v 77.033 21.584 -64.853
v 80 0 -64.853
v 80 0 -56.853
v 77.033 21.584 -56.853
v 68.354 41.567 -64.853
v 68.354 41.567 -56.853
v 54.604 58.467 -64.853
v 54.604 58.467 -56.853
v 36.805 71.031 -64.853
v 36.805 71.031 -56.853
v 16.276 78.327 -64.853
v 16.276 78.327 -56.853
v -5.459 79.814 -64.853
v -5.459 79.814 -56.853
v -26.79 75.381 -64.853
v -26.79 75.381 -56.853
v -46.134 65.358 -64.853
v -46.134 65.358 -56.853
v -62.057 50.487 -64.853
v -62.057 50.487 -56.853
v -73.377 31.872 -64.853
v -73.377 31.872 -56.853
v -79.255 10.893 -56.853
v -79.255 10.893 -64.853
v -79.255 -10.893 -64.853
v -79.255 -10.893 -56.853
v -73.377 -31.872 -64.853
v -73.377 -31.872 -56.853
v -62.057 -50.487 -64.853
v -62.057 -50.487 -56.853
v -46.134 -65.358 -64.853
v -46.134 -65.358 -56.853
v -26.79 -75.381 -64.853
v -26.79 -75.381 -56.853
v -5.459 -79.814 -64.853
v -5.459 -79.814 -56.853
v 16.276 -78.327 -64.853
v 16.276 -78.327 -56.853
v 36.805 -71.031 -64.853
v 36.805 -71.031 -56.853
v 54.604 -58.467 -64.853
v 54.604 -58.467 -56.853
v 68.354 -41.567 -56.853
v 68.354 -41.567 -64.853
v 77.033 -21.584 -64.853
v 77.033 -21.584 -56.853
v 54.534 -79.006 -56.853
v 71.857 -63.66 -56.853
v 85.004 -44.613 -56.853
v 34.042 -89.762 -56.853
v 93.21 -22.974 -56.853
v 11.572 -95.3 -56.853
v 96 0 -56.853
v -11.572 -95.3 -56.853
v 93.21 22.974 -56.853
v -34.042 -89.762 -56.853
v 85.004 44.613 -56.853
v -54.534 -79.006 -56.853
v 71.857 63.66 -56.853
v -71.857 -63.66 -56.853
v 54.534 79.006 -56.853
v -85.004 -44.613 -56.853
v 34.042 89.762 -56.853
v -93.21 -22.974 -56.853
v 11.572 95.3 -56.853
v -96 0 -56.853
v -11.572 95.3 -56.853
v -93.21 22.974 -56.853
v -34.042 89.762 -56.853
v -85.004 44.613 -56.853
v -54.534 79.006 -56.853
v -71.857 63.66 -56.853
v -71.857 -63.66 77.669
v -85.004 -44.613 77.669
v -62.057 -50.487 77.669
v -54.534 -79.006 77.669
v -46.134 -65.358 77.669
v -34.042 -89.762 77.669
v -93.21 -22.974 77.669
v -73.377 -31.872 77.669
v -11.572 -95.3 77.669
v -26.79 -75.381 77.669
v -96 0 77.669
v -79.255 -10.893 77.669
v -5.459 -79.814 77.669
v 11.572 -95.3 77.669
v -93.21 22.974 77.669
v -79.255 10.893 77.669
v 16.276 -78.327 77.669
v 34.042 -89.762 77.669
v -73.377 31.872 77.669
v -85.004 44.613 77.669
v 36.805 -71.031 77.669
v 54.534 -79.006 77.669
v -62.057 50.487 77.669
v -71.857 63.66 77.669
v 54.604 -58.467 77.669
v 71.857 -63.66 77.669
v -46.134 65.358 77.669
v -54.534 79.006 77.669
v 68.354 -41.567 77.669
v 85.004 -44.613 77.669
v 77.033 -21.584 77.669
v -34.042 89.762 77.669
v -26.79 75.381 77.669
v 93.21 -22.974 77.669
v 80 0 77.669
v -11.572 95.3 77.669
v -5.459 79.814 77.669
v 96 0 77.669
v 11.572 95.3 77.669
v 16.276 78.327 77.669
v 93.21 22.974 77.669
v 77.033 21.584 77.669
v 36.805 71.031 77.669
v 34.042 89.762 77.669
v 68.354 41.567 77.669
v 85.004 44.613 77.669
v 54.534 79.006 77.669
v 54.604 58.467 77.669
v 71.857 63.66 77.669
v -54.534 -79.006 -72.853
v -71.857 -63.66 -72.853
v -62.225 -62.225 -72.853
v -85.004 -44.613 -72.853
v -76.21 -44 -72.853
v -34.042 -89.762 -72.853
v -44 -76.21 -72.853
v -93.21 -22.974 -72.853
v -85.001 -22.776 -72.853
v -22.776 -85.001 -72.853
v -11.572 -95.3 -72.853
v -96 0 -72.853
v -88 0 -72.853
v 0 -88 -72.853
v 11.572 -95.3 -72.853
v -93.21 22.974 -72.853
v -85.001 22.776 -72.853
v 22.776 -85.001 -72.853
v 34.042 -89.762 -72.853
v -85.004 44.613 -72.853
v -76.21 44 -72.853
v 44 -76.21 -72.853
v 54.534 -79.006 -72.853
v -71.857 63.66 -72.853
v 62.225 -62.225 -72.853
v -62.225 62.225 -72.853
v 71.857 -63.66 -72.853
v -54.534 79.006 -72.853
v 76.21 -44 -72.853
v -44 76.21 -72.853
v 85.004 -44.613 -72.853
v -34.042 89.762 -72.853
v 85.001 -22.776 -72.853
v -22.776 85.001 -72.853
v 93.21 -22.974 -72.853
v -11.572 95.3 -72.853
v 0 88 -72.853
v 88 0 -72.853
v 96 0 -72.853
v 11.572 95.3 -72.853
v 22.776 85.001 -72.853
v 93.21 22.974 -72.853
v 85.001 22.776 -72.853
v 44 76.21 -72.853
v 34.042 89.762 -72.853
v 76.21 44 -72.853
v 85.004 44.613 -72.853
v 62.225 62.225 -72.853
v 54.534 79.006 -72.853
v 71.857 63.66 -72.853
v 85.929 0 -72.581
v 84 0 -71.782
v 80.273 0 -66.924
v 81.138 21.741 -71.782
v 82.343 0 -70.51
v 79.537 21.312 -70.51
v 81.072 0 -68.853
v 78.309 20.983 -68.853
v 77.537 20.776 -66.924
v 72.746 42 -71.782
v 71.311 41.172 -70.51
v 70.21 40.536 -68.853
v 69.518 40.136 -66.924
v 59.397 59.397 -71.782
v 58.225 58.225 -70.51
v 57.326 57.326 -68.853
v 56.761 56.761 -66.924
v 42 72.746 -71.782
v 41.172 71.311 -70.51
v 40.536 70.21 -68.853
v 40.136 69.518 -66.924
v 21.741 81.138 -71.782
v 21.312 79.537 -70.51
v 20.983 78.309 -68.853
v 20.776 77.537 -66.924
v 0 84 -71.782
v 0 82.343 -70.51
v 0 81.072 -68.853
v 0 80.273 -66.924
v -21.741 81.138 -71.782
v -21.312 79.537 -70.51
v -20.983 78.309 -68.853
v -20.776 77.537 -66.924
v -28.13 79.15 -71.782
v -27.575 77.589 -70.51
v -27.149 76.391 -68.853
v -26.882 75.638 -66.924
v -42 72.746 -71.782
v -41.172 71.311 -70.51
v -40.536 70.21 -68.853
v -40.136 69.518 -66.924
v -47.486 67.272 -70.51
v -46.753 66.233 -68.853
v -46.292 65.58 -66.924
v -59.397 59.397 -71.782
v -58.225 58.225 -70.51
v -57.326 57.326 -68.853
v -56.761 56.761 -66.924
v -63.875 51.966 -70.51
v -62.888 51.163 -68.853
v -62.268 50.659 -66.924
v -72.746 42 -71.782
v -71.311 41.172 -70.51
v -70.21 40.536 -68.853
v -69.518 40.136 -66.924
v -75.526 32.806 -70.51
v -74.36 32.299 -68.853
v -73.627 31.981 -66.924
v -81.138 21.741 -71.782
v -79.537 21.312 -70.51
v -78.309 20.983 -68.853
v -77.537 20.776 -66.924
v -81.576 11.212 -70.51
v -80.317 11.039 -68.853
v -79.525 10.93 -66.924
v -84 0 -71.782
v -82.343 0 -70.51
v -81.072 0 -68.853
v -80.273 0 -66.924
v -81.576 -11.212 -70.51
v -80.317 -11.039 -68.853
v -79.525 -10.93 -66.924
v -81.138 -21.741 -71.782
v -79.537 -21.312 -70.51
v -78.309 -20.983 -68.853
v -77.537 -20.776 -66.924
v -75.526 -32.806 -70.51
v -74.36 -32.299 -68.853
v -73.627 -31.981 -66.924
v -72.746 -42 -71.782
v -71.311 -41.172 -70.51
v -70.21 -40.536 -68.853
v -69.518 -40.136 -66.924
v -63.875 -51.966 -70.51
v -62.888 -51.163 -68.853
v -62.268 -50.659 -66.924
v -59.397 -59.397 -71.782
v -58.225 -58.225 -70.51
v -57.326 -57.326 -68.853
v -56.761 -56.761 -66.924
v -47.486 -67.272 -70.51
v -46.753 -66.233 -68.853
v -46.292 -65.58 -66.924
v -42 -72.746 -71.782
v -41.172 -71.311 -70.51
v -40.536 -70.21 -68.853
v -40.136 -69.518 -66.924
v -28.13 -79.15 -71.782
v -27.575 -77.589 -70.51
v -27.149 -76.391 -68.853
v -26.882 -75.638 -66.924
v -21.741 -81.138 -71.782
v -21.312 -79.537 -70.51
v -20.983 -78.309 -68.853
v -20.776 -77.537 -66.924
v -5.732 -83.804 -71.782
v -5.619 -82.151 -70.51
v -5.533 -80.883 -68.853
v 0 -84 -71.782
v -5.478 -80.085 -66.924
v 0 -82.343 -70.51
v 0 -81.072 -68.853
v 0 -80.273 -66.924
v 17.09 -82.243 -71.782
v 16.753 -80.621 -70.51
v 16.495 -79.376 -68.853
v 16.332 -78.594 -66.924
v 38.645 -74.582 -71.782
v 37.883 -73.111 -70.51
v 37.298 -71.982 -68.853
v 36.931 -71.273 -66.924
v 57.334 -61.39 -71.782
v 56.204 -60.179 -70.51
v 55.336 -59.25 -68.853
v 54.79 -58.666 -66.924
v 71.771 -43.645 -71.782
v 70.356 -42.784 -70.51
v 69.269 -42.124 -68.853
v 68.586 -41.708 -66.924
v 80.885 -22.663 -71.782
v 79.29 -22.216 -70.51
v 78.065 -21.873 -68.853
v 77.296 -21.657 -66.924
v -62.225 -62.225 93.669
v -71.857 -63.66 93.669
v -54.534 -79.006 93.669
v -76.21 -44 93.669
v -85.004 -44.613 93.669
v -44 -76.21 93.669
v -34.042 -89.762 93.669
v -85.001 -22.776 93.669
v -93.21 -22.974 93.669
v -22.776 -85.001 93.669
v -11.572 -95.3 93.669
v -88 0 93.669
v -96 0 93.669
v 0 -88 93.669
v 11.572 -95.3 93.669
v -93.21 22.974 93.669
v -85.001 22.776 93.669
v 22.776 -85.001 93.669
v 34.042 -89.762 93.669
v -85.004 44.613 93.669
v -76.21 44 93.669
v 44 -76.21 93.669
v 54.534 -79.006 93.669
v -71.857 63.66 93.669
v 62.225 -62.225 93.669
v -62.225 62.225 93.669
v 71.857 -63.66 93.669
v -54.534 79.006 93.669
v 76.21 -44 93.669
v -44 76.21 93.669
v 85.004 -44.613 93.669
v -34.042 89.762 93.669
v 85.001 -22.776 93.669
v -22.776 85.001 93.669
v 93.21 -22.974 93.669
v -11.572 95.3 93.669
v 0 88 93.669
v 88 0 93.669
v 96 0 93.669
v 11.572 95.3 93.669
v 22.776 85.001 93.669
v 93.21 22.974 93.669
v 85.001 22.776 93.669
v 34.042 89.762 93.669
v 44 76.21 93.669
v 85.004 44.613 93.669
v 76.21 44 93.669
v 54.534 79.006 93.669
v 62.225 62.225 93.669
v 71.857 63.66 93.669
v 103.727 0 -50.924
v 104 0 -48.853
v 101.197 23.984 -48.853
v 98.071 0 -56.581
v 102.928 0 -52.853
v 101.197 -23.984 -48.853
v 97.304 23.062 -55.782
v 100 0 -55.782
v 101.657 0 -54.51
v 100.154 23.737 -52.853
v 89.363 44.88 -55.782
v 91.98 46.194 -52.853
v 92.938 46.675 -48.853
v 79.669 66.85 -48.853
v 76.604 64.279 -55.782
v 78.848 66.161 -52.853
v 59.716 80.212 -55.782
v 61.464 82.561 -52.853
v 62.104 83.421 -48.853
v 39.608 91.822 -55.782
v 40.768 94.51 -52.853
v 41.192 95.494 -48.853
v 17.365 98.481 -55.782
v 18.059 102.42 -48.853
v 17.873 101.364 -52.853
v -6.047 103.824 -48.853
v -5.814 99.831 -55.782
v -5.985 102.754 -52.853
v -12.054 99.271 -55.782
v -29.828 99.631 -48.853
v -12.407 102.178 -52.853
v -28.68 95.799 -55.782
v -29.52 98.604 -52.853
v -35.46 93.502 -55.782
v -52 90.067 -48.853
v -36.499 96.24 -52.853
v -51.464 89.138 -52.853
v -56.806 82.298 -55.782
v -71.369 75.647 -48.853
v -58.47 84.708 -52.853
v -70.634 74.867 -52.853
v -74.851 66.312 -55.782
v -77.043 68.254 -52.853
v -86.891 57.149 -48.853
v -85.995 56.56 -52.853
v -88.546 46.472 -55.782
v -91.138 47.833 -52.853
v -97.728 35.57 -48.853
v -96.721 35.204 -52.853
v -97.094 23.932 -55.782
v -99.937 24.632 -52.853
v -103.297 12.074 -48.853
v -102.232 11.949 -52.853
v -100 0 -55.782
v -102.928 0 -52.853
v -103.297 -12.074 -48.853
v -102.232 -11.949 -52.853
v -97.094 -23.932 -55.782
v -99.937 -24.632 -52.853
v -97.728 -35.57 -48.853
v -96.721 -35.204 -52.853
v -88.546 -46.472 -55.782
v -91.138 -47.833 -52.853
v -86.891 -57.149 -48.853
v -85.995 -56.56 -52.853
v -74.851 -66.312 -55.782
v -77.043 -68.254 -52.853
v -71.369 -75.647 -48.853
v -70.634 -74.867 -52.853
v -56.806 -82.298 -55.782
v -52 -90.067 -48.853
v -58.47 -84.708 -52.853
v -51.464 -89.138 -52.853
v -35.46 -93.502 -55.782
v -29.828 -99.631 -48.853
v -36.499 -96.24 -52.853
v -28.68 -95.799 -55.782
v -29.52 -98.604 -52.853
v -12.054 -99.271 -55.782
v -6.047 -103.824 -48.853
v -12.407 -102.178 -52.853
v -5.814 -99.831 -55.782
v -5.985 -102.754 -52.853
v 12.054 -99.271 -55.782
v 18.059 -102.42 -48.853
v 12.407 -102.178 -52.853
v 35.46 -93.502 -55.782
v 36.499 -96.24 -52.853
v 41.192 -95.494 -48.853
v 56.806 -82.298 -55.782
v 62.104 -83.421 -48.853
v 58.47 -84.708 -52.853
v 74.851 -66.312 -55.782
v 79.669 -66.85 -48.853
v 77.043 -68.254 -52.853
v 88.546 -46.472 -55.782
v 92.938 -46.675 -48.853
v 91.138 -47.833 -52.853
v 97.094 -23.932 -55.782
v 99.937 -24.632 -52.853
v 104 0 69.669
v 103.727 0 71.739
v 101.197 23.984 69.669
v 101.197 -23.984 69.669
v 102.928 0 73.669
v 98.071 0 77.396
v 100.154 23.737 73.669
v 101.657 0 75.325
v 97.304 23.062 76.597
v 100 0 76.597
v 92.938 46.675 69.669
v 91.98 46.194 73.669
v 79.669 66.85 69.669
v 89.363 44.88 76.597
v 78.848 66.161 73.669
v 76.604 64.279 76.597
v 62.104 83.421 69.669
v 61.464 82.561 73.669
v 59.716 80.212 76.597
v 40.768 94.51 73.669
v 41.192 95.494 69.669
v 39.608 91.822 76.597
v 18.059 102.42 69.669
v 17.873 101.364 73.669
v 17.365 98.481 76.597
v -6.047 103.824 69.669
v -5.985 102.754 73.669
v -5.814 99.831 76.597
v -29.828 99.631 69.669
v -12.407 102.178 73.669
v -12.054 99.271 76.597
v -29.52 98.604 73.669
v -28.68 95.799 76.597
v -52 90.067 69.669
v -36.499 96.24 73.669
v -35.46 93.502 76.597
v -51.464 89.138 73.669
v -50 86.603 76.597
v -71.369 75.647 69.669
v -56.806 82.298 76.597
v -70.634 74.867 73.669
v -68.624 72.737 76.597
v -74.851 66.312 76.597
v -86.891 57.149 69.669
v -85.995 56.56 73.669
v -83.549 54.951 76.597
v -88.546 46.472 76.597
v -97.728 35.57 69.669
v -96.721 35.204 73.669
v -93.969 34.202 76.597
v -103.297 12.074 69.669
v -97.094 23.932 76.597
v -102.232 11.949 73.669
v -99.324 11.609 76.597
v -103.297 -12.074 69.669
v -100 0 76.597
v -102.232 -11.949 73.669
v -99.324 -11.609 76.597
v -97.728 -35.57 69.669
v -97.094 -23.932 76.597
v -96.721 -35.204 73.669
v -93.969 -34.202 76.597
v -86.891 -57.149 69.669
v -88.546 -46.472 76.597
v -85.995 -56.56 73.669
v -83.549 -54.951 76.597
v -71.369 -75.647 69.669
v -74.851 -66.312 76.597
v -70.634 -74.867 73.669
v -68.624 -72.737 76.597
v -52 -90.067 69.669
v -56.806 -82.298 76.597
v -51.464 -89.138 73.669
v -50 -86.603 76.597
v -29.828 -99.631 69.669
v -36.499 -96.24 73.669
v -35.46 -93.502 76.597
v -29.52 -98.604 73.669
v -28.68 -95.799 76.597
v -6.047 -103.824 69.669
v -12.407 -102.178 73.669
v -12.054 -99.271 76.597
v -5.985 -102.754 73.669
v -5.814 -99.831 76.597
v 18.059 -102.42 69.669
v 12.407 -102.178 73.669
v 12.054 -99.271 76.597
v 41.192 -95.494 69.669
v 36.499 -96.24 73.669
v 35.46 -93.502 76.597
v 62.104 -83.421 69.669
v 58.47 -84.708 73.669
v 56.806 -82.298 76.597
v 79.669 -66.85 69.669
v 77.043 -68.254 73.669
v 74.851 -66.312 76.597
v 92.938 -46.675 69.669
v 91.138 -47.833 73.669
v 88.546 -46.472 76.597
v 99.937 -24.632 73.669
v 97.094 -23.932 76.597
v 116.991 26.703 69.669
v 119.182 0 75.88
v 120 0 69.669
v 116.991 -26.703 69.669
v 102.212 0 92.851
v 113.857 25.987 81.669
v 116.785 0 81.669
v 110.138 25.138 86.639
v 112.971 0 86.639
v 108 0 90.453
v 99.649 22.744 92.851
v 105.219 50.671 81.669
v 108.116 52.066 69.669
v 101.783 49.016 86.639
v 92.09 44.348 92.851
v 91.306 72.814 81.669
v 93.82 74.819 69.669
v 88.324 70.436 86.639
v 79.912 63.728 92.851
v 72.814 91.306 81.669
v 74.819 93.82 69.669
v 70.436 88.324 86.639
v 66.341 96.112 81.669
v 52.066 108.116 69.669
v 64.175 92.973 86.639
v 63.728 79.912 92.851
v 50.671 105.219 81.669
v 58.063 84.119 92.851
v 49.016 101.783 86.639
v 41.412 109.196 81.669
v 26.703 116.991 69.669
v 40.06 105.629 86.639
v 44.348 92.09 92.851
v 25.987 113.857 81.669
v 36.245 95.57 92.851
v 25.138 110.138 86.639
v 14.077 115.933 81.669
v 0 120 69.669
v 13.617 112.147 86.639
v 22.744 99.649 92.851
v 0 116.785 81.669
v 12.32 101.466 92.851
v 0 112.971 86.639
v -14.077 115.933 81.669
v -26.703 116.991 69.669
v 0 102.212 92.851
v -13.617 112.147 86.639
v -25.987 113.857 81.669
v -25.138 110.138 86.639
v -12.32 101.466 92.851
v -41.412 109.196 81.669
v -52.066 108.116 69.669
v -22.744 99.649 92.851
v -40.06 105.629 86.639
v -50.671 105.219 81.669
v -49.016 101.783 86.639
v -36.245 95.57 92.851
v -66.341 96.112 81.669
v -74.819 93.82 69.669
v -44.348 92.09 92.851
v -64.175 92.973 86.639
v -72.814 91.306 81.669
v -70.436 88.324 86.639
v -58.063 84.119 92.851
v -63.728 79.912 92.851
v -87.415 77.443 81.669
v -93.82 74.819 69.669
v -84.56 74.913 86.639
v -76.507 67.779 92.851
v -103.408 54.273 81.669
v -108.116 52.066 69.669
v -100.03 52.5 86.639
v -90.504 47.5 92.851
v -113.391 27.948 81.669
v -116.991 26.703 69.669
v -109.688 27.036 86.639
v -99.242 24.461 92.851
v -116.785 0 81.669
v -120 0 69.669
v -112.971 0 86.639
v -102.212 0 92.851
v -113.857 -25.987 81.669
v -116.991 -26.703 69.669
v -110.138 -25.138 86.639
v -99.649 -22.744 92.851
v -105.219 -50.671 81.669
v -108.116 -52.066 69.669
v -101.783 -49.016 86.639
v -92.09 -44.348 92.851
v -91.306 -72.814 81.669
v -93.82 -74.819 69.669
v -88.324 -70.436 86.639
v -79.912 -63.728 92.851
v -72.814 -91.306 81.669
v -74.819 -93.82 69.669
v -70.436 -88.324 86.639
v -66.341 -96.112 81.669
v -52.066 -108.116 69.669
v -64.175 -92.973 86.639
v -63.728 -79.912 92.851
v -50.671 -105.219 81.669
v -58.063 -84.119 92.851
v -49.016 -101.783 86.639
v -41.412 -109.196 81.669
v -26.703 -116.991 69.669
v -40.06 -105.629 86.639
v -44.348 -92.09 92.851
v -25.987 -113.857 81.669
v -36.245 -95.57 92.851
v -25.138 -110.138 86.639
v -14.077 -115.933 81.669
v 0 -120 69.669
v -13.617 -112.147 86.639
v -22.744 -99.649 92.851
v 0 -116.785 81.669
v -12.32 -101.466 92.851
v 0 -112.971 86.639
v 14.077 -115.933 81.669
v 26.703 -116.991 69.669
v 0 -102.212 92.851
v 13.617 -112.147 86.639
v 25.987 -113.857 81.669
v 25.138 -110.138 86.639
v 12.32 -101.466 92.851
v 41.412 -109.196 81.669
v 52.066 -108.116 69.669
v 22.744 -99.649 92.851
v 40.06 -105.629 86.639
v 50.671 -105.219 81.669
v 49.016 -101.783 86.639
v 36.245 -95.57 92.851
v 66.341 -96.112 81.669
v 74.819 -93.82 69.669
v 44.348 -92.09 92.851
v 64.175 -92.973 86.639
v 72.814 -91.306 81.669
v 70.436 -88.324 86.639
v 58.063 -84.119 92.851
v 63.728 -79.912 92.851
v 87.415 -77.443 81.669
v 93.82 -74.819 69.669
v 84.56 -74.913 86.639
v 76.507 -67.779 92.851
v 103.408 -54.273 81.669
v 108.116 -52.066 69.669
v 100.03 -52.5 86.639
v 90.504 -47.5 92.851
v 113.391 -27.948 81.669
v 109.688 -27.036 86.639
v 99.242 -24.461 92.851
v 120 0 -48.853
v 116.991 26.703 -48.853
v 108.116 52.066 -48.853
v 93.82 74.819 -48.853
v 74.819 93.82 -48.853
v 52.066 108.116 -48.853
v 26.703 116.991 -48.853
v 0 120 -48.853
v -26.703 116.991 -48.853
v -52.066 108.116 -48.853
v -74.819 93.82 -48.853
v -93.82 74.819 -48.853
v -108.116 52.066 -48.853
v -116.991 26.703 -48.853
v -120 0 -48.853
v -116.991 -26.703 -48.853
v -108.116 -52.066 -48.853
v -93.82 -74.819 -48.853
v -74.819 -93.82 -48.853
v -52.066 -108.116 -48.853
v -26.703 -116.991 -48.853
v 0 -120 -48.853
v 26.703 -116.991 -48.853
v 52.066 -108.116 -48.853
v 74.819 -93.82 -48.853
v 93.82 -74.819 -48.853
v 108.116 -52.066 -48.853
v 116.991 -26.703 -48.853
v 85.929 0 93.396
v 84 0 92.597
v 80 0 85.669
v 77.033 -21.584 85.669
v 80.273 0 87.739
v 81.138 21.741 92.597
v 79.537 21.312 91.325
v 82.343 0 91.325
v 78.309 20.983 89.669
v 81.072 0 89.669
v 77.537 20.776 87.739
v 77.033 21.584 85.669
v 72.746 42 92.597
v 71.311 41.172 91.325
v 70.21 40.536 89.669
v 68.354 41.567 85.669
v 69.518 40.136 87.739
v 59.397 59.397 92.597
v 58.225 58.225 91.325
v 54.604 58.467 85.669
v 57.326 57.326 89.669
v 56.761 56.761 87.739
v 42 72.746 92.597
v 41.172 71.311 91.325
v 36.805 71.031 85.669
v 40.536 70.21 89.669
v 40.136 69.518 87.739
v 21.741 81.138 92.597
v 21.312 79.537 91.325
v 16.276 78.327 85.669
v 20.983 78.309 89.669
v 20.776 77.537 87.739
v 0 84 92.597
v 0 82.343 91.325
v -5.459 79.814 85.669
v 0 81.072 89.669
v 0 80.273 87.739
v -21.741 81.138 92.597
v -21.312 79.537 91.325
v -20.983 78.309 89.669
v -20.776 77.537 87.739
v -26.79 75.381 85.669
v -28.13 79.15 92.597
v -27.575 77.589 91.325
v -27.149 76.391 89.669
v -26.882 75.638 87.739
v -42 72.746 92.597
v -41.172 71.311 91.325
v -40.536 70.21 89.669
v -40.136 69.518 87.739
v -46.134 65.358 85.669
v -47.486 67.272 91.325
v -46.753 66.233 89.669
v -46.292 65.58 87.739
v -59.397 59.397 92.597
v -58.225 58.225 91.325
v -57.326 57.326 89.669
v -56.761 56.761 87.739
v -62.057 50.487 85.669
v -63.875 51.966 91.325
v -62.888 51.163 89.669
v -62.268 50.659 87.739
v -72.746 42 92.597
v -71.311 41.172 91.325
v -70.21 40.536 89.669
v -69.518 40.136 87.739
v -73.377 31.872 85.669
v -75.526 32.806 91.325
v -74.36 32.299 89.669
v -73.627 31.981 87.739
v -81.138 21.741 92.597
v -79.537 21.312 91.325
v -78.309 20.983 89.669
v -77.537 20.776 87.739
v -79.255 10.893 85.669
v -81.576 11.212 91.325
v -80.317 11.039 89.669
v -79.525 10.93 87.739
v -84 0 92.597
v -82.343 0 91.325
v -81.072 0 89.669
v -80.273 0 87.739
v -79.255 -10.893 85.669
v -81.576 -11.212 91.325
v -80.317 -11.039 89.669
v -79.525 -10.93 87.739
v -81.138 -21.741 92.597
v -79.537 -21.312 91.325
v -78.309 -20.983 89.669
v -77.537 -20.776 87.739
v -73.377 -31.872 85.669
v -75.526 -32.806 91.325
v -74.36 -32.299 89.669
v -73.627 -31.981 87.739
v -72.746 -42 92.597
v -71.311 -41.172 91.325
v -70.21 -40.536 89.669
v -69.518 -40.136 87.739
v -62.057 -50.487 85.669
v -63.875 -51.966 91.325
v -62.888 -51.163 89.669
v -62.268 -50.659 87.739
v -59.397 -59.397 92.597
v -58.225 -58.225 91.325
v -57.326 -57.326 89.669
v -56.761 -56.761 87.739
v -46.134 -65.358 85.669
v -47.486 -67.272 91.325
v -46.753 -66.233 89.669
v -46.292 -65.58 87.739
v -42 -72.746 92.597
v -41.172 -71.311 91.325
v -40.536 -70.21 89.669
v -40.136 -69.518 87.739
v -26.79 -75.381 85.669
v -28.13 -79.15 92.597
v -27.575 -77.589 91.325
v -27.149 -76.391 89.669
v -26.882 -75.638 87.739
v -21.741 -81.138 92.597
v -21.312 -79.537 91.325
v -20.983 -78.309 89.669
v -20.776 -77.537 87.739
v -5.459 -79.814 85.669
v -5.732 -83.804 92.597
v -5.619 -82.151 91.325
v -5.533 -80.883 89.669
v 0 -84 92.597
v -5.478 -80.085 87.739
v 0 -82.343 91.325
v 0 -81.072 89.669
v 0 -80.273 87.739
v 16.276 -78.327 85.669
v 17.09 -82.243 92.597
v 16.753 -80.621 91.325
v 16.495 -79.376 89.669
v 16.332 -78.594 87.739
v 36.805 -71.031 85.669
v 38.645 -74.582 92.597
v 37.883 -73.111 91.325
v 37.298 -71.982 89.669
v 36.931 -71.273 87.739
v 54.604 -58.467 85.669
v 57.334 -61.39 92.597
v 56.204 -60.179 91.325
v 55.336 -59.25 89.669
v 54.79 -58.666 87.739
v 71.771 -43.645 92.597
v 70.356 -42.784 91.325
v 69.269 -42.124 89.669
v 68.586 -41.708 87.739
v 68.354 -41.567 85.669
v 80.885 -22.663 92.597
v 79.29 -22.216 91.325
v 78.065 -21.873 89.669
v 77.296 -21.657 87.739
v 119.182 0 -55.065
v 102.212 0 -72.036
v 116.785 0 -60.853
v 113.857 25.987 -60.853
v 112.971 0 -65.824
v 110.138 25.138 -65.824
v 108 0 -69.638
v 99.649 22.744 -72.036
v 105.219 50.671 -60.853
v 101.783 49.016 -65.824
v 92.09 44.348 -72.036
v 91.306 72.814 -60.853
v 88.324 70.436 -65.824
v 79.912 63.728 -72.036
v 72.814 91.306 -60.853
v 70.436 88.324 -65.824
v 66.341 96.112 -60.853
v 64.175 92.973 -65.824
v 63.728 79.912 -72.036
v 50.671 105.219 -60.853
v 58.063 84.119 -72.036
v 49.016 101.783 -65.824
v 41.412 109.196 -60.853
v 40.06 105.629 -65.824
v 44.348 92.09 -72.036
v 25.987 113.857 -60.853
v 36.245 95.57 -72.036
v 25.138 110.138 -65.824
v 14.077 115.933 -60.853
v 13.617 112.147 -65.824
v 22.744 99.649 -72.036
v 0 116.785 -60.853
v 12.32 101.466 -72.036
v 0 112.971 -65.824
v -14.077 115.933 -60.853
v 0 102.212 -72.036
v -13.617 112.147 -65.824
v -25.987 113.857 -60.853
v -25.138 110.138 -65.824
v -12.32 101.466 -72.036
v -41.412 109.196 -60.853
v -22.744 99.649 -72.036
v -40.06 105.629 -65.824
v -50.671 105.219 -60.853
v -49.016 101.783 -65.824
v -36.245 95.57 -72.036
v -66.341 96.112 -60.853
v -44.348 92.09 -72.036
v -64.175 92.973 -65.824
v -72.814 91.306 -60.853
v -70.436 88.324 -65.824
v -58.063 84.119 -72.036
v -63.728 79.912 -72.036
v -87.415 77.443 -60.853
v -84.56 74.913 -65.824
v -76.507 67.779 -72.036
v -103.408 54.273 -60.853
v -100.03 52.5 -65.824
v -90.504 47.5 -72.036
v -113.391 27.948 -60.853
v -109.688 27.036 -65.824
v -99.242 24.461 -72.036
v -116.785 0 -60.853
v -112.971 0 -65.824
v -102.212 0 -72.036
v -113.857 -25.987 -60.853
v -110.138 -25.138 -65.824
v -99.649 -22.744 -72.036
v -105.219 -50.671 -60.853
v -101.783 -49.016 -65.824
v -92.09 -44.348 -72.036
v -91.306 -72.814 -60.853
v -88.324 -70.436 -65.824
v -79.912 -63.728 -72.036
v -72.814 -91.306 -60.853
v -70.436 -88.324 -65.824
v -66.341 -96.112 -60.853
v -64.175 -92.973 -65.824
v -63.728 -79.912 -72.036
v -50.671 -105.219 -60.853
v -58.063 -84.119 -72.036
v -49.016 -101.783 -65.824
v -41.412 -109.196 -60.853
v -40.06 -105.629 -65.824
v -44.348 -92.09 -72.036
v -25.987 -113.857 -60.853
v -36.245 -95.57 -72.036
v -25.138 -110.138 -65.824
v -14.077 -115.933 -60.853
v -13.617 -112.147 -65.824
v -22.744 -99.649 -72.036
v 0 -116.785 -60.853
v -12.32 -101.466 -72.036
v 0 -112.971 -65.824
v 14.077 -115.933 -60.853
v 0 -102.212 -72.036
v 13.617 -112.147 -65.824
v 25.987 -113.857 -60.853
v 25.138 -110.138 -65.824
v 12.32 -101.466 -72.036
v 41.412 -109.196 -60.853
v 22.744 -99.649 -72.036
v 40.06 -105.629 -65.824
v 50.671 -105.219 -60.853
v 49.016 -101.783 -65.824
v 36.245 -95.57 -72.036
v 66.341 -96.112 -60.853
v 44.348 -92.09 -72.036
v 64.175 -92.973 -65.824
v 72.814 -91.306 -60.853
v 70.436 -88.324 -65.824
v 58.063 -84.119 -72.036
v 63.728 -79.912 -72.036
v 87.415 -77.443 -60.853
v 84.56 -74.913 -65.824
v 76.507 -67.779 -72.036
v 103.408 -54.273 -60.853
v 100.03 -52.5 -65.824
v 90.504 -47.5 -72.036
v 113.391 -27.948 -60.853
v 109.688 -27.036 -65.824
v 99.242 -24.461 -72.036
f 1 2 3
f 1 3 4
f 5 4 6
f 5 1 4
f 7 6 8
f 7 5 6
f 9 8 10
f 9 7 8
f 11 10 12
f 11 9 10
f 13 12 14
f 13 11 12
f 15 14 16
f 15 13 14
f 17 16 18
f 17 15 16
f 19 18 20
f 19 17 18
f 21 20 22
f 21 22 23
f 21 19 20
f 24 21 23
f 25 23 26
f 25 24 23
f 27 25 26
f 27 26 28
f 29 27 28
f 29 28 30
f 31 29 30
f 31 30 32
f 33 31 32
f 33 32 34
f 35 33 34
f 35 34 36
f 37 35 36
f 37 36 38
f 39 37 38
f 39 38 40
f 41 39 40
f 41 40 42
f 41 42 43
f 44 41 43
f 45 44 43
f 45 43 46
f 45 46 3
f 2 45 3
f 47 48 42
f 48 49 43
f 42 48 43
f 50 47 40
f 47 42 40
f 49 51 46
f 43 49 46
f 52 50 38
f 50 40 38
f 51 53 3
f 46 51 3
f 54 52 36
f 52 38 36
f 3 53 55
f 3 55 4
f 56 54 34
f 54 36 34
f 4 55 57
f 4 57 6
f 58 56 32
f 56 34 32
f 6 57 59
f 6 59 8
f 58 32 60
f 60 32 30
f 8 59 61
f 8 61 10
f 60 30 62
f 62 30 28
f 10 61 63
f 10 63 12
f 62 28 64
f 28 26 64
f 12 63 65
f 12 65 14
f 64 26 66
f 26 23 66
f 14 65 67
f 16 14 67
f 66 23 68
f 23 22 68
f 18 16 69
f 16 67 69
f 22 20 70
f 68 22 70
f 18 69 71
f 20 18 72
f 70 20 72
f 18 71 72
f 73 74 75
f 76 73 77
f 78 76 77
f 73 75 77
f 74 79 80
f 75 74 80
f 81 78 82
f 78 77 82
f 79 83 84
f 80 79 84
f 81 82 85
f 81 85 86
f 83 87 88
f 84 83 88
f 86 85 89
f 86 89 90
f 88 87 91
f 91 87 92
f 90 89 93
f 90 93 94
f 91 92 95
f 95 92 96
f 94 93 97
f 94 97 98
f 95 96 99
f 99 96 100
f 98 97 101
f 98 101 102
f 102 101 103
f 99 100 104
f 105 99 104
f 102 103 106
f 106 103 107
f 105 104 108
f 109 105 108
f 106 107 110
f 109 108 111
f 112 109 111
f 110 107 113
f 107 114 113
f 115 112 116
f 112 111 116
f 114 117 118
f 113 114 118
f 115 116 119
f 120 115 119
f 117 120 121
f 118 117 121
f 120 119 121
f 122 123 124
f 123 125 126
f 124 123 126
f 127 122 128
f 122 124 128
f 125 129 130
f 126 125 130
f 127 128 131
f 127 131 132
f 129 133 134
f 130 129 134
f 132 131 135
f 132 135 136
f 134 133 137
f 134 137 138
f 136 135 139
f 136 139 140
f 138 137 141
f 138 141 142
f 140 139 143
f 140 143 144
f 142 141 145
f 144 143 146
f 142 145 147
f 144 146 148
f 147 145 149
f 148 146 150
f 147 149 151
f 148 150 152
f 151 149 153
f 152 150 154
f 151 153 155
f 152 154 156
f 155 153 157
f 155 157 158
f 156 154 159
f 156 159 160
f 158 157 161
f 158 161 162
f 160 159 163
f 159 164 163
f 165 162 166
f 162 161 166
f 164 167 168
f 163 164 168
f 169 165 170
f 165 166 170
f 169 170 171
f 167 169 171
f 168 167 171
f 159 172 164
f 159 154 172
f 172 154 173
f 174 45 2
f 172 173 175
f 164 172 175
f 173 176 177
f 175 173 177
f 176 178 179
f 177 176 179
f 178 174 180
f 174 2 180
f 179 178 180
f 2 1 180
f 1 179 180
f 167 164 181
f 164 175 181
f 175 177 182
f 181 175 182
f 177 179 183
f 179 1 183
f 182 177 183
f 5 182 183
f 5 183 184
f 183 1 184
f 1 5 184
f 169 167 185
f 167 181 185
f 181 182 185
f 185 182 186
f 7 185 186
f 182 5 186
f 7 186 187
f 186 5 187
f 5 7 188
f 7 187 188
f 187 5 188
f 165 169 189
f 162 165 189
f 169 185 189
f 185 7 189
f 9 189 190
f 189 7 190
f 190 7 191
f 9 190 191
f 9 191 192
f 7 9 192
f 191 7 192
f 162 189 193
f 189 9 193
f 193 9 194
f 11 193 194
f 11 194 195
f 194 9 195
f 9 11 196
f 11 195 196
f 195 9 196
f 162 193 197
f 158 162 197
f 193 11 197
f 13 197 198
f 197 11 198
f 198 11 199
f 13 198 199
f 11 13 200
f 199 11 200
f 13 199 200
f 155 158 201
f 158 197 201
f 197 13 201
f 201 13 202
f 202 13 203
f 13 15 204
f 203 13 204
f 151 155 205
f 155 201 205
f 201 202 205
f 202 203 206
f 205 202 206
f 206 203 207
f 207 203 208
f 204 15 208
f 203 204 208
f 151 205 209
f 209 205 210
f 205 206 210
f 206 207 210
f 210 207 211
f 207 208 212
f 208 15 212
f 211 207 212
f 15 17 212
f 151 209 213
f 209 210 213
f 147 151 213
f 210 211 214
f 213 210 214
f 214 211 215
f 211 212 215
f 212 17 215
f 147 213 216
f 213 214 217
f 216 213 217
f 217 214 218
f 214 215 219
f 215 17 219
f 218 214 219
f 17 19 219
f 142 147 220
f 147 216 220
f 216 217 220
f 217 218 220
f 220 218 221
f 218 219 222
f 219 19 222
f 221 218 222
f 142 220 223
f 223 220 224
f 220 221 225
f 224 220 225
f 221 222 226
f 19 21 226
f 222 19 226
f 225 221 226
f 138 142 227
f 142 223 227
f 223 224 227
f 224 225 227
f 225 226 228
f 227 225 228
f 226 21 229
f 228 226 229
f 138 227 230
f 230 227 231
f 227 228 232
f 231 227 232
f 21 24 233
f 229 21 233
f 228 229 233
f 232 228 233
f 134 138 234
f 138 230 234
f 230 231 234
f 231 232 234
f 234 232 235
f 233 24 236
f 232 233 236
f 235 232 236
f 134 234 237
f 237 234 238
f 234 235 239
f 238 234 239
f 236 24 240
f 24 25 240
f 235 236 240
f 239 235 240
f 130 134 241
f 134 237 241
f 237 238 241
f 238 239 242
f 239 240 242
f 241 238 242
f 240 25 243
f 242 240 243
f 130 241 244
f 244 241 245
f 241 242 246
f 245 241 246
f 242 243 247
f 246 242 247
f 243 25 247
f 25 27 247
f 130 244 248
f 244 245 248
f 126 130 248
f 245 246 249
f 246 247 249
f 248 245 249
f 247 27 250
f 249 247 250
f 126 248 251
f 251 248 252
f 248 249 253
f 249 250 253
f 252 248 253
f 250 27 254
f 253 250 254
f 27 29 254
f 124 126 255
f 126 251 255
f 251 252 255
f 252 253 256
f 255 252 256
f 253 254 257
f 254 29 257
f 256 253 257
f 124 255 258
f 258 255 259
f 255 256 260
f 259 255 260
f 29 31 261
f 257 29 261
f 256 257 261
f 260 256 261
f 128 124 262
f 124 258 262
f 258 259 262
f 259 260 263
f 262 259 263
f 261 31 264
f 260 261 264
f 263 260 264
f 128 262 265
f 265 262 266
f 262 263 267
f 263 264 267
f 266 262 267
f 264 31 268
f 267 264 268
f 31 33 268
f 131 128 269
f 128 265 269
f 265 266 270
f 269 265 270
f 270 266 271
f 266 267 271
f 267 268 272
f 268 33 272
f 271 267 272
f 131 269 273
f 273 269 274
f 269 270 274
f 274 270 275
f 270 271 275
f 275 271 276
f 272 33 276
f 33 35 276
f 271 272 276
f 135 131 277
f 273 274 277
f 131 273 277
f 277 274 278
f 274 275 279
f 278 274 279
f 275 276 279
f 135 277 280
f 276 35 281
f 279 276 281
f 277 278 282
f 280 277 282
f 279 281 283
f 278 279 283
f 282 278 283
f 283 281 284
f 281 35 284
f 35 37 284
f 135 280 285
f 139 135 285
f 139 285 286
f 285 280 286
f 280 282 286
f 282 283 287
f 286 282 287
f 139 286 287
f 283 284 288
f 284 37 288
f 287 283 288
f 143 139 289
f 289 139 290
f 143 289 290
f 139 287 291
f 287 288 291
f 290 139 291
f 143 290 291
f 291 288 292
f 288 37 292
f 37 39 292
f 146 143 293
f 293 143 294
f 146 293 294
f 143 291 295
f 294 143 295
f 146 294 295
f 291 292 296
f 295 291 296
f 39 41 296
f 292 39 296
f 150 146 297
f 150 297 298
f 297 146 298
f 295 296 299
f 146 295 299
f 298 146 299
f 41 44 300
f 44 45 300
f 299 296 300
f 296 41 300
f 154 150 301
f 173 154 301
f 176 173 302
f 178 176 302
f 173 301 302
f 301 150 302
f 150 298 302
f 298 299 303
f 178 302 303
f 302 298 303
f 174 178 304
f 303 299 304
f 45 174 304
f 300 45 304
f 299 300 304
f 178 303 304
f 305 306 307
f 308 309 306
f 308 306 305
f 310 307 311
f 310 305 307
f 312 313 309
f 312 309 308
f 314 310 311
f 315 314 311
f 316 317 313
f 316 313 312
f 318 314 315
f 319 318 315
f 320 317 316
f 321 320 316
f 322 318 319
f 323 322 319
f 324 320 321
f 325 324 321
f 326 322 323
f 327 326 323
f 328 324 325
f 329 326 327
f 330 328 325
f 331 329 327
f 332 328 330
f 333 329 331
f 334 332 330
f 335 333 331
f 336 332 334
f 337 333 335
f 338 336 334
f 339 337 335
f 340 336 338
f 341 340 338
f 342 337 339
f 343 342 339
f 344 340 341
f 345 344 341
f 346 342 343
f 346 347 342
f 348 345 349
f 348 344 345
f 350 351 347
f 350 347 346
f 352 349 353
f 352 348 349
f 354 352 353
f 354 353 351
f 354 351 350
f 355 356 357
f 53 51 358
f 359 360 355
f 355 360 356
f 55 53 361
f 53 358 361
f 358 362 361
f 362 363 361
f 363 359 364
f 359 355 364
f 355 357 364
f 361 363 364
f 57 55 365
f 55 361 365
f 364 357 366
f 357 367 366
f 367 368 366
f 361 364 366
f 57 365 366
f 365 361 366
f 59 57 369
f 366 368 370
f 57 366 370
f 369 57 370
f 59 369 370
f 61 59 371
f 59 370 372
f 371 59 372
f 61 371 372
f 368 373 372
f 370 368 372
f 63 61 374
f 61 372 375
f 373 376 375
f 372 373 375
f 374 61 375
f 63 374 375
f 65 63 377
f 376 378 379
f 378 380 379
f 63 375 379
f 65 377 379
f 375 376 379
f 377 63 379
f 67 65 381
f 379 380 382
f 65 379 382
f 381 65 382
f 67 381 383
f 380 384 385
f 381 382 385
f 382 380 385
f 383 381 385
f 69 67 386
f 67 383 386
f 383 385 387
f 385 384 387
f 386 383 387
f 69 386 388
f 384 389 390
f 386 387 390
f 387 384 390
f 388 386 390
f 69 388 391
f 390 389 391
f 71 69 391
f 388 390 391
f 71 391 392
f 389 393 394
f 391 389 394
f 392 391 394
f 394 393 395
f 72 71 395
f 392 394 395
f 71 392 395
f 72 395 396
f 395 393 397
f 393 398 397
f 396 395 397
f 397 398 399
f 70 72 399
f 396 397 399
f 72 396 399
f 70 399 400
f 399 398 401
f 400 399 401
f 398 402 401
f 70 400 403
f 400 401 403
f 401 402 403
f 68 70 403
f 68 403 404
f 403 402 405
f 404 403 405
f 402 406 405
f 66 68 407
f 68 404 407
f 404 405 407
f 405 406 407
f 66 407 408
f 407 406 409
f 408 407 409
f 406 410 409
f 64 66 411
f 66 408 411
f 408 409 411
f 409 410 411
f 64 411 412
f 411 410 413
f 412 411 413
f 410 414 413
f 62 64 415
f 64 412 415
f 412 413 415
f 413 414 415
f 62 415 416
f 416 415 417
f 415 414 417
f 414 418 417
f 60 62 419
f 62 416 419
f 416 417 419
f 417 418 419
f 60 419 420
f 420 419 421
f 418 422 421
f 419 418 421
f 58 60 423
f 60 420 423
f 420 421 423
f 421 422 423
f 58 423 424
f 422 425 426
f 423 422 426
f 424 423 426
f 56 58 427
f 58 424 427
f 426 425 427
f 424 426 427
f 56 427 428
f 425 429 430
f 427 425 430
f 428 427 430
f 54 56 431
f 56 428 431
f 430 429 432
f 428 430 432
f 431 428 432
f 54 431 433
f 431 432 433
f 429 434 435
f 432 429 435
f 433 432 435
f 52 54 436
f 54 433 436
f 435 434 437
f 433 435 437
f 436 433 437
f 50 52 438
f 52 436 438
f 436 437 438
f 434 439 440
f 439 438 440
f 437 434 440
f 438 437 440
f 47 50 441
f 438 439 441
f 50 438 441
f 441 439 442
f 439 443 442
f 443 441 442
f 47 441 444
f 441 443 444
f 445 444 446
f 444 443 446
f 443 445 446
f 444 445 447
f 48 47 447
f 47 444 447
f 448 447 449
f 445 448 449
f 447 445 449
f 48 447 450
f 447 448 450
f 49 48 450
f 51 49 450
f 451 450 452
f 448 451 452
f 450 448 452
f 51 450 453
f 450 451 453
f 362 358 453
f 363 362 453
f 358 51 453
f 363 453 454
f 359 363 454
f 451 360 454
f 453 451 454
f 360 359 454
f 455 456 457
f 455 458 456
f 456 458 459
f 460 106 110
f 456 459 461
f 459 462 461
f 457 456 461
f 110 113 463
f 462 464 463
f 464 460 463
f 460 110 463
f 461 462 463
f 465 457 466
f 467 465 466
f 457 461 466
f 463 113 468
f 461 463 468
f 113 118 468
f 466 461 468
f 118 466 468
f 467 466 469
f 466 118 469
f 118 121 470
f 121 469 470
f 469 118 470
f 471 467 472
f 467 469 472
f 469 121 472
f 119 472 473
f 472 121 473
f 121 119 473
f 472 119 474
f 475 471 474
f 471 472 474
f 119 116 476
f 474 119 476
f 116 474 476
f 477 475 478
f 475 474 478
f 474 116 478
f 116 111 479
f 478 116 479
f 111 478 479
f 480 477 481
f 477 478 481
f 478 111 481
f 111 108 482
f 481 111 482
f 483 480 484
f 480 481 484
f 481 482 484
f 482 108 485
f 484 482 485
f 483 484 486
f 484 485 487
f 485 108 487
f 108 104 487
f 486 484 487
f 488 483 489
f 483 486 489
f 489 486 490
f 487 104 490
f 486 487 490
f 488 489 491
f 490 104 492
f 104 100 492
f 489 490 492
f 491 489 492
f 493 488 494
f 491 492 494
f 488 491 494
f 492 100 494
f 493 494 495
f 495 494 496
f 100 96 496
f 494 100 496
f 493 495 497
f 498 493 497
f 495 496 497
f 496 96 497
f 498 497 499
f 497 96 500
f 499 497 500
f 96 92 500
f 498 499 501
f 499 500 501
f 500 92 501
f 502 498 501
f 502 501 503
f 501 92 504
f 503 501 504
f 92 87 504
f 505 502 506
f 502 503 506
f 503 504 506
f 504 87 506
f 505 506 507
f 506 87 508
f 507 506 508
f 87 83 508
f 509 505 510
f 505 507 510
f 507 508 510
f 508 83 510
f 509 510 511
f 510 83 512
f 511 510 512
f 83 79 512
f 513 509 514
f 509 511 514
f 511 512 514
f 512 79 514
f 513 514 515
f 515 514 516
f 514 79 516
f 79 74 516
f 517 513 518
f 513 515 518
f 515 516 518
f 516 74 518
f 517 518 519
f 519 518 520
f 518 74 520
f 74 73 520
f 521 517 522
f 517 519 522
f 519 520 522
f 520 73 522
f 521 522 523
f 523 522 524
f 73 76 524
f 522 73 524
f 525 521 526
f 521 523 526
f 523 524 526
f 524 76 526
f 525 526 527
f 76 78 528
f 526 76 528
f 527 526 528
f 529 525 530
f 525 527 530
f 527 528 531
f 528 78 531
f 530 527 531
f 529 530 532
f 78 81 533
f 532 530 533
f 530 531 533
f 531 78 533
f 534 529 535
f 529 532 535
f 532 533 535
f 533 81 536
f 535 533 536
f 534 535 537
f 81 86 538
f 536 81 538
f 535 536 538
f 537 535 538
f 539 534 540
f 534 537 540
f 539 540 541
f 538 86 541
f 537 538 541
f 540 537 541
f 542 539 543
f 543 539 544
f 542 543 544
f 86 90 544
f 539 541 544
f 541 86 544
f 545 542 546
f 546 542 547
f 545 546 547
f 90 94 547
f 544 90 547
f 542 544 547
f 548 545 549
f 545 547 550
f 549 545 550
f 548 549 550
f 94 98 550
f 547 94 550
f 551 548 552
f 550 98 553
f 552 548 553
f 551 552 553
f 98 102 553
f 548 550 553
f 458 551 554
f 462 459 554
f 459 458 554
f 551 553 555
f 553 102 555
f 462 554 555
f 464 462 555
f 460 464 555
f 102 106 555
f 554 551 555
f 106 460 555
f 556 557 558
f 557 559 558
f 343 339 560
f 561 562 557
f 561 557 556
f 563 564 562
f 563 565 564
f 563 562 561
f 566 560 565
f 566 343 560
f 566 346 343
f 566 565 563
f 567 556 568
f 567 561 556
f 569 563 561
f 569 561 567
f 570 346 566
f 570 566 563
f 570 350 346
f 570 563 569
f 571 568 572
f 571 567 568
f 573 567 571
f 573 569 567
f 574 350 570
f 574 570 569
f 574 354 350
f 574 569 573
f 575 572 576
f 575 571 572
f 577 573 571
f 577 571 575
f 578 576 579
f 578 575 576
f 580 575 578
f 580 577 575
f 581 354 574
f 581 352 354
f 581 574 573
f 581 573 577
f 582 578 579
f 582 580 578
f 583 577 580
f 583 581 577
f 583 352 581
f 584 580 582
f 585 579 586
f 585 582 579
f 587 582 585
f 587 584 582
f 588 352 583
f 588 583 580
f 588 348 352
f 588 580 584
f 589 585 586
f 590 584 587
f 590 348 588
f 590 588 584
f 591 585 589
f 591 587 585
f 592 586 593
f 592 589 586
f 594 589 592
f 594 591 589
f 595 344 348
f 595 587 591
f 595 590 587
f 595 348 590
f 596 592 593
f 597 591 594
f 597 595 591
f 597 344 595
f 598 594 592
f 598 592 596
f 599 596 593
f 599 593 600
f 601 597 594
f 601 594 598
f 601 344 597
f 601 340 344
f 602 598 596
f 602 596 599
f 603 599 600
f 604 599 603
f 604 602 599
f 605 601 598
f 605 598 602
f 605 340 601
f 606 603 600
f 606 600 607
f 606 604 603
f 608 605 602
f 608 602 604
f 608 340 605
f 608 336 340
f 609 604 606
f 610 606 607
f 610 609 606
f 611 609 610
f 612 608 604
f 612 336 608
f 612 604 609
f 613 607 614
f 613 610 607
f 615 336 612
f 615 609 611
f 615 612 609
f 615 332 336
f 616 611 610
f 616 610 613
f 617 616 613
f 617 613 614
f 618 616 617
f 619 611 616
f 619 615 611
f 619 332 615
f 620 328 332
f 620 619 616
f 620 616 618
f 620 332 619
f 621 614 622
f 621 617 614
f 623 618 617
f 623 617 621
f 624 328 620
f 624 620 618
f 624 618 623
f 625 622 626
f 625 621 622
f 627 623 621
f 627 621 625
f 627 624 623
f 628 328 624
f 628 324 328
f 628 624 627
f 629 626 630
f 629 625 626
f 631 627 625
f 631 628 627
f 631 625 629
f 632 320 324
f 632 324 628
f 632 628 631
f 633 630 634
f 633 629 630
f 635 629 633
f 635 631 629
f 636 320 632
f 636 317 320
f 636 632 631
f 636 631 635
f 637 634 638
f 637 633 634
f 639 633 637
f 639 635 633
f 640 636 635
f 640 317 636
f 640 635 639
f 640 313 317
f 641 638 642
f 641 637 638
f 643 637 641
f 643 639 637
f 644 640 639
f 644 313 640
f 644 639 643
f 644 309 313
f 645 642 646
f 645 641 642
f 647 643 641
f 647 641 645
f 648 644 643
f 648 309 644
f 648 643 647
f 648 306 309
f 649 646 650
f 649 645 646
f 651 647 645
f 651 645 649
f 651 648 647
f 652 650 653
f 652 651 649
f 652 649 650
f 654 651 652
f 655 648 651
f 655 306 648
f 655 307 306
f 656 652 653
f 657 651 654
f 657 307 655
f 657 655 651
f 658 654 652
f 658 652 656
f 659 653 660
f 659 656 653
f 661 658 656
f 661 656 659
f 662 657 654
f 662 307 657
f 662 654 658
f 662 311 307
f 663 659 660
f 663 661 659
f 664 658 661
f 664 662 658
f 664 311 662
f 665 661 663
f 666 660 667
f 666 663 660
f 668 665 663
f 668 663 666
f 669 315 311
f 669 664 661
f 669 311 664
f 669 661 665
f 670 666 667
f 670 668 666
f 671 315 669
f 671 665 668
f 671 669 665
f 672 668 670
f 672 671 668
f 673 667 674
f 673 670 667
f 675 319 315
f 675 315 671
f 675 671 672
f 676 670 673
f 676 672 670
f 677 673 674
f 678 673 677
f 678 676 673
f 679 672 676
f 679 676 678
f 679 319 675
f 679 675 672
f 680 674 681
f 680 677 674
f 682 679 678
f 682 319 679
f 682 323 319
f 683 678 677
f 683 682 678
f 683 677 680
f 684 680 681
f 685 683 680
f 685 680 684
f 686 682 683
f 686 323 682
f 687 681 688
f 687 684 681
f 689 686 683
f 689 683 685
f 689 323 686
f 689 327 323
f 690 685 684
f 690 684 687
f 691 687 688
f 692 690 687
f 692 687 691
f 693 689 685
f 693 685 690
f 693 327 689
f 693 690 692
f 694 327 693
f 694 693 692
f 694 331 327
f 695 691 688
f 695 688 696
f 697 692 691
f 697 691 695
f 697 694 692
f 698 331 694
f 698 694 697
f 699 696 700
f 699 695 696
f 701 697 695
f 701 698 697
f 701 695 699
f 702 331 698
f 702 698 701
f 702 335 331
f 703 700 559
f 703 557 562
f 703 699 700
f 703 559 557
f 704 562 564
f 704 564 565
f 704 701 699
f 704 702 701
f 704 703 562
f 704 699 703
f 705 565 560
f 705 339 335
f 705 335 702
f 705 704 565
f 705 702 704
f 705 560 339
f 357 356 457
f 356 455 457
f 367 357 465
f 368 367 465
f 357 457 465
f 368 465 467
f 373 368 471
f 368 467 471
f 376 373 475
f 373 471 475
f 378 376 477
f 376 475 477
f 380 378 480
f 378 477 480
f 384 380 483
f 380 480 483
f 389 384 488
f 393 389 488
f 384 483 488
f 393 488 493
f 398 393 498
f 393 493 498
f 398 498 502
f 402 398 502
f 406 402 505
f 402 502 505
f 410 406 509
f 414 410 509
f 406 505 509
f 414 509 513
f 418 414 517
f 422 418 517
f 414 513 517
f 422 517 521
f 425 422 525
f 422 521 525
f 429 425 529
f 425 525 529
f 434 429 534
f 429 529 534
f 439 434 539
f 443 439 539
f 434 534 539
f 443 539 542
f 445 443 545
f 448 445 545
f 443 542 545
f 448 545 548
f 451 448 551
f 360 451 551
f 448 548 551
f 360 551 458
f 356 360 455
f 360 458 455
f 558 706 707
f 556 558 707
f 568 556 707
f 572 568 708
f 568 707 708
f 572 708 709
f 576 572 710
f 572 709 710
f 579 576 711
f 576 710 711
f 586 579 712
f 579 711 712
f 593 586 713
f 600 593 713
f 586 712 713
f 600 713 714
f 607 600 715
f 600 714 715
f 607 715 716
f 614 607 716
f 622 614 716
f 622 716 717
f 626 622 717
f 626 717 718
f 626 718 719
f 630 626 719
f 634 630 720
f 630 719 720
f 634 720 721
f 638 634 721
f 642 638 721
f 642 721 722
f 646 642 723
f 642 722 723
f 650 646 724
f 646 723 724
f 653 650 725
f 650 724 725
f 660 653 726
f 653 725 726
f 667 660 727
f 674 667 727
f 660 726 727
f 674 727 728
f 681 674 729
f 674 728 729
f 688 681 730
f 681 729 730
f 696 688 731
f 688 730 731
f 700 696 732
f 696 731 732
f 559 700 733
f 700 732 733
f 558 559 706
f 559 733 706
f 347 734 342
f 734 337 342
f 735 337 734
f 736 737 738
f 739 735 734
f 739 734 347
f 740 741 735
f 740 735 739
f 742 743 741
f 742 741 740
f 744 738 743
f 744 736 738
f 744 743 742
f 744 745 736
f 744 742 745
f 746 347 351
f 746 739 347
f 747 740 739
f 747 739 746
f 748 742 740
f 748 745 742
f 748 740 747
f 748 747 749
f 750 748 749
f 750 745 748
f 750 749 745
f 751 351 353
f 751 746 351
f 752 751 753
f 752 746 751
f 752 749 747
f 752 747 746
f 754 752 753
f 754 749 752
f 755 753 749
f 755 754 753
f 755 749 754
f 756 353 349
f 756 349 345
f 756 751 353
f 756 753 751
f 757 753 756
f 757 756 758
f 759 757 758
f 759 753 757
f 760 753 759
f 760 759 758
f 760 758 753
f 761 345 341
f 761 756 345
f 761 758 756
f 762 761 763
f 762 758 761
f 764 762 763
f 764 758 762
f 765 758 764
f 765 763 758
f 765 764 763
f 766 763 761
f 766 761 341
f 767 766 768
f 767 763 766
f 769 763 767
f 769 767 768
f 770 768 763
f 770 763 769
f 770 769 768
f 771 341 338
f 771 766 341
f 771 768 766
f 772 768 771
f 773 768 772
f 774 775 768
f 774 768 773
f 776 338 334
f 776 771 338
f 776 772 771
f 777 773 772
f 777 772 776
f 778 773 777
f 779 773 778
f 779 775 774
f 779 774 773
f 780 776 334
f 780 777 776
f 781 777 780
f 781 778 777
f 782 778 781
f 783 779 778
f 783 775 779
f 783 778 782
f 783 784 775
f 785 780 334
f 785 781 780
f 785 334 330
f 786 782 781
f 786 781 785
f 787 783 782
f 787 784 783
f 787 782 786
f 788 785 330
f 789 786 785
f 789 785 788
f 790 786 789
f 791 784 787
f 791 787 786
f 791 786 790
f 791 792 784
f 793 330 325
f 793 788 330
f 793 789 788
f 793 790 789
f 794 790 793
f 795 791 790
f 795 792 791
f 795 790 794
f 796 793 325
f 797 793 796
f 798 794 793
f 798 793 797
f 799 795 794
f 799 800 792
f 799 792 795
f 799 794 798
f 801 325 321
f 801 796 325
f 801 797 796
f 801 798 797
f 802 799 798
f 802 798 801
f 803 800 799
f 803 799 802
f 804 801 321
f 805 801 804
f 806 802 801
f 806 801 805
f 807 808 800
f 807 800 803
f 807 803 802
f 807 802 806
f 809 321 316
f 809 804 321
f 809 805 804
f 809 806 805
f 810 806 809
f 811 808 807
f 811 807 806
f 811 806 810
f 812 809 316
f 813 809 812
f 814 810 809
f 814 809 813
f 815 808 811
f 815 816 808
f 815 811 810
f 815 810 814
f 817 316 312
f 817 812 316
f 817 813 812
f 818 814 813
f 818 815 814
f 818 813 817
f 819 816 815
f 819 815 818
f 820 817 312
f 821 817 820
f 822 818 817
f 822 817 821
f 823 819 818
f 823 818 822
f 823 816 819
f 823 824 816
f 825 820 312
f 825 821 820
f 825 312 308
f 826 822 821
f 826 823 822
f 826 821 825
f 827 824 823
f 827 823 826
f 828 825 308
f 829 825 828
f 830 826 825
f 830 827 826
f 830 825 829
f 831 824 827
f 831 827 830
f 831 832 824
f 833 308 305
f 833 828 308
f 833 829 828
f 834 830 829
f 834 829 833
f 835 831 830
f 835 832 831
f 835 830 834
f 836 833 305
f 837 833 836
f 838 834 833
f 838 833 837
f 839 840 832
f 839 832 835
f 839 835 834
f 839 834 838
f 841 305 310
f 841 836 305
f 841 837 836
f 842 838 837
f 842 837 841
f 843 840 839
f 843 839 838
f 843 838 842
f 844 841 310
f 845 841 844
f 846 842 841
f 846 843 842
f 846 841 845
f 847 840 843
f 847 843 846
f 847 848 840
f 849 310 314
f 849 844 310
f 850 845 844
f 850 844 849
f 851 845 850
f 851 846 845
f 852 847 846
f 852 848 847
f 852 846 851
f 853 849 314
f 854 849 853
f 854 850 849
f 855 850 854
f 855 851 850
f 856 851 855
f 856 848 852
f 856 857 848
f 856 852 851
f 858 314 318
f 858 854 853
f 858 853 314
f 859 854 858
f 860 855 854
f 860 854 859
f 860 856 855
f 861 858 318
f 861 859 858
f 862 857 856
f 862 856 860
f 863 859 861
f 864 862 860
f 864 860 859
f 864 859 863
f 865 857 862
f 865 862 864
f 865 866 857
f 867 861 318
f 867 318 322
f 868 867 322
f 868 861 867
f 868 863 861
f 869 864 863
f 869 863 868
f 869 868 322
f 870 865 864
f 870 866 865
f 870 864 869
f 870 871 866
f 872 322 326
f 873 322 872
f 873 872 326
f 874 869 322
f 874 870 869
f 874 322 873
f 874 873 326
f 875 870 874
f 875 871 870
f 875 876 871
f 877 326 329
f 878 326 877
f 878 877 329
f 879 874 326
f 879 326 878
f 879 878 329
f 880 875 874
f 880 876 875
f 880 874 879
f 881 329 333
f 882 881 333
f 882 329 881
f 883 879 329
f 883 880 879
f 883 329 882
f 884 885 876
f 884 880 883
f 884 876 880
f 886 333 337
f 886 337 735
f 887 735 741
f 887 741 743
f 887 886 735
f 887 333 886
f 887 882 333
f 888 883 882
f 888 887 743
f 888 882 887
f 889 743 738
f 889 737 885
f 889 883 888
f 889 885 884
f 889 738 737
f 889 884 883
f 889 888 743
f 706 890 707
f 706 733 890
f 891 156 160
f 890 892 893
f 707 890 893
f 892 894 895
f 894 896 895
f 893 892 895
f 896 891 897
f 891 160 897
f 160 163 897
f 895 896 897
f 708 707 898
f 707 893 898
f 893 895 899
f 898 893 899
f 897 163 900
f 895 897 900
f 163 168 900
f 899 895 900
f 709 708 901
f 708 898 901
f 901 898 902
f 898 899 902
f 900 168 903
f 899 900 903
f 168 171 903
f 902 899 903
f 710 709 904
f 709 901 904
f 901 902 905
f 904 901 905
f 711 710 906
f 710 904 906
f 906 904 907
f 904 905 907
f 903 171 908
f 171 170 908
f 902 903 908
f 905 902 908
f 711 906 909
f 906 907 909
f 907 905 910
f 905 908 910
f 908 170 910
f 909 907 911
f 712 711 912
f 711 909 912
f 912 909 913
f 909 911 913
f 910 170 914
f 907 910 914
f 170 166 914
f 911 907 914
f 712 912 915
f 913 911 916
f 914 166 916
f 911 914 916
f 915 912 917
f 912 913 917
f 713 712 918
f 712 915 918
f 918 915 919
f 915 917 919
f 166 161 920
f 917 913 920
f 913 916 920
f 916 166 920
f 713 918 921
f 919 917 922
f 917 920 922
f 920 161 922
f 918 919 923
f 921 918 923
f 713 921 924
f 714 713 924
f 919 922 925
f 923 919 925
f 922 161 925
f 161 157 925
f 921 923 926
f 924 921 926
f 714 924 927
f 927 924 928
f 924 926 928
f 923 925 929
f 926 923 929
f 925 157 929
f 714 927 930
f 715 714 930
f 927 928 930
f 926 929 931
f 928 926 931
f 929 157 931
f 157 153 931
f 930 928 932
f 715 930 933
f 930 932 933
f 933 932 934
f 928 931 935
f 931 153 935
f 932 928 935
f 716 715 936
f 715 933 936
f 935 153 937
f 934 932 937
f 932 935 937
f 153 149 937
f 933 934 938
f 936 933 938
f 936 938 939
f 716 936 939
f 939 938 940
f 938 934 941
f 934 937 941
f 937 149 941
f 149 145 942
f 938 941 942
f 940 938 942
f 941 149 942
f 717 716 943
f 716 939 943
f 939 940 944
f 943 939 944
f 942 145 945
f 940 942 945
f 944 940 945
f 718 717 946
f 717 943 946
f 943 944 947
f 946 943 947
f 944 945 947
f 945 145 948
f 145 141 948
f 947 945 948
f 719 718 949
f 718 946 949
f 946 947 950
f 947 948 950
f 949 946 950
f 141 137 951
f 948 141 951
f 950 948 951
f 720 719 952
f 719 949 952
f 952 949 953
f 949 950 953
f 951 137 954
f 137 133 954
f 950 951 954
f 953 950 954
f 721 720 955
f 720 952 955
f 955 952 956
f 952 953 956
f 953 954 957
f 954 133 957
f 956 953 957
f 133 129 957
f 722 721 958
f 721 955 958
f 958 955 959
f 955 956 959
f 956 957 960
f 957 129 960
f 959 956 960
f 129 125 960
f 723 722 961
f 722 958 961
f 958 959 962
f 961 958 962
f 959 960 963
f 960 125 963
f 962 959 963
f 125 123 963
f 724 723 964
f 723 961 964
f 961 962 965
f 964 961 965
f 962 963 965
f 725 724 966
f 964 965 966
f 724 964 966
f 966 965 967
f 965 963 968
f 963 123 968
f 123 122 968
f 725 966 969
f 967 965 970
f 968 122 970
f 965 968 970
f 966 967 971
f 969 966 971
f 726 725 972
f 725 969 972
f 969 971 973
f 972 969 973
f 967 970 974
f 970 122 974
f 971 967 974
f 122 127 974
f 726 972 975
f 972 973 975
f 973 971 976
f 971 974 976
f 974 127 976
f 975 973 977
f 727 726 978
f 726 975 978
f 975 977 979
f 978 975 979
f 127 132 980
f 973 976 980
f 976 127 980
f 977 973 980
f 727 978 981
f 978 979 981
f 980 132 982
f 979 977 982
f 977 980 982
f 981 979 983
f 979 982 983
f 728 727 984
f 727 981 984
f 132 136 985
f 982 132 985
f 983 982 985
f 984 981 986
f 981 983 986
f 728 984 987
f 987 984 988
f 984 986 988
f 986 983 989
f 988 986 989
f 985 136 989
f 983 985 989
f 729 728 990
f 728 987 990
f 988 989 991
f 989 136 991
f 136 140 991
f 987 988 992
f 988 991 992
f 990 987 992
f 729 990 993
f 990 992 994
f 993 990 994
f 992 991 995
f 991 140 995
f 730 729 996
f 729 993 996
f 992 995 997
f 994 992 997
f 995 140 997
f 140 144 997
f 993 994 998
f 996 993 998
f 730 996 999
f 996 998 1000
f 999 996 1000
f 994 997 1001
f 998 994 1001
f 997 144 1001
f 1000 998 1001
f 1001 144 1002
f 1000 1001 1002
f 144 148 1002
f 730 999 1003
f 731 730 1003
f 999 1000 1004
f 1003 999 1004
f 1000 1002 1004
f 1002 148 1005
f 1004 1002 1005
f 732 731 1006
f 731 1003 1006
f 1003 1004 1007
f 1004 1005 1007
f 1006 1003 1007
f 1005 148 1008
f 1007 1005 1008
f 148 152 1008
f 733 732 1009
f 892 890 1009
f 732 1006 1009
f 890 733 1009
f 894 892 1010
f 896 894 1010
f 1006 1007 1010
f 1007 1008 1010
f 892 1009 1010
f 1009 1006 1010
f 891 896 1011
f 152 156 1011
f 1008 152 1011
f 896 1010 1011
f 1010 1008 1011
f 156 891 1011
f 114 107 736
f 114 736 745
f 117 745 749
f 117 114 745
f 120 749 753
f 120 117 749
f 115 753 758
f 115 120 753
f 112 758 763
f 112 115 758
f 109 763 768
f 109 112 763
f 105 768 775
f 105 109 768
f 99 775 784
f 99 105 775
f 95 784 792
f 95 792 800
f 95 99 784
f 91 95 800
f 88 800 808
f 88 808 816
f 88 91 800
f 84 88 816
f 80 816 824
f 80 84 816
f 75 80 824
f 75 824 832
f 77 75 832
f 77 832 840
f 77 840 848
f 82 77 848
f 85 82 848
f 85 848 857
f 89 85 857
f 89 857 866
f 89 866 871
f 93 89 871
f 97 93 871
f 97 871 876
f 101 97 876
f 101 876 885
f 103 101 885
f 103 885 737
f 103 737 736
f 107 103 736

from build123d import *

# Parameters (mm, degrees)
CROQUIS1_R            = 15
CROQUIS1_R_2          = 10
EXTRUIR_L_MINA1_DEPTH = 20.815243217
REDONDEO1_R           = 3
REDONDEO2_R           = 1
ESCALA4_SCALE         = 4
ESCALA6_SCALE         = 2


# Read off the part's stored shape, not the designer's step: Vaciado1
with BuildPart() as part:
    # Croquis1 → Extruir-Lámina1 (new body)
    with BuildSketch(Plane.XY):
        Circle(CROQUIS1_R)
        Circle(CROQUIS1_R_2, mode=Mode.SUBTRACT)
    extrude(amount=EXTRUIR_L_MINA1_DEPTH)

    # Redondeo1
    redondeo1_edges = [part.edges().sort_by_distance(p)[0] for p in [
        (-15, 0, 0),
        (-15, 0, 20.815243217),
    ]]
    fillet(redondeo1_edges, radius=REDONDEO1_R)

    # Redondeo2
    redondeo2_edges = [part.edges().sort_by_distance(p)[0] for p in [
        (-10, 0, 0),
        (-10, 0, 20.815243217),
    ]]
    fillet(redondeo2_edges, radius=REDONDEO2_R)

    # Vaciado1 outline → Vaciado1 (revolve, cut)
    with BuildSketch(Plane.XZ):
        with BuildLine():
            Line((12, 18.815243217), (10, 18.815243217))
            Line((10, 18.815243217), (10, 2))
            Line((10, 2), (12, 2))
            ThreePointArc((12, 2), (12.707106781, 2.292893219), (13, 3))
            Line((13, 3), (13, 17.815243217))
            ThreePointArc((13, 17.815243217), (12.707106781, 18.522349998), (12, 18.815243217))
        make_face()
    revolve(axis=Axis((0, 0, 0), (0, 0, 1)), mode=Mode.SUBTRACT)


with BuildPart() as part_1:
    # Escala4: scaled about (0, 0, 10.407621608)
    add(part.part.scale(ESCALA4_SCALE).moved(Location((0, 0, -31.222864824))))


with BuildPart() as part_2:
    # Escala6: scaled about (0, 0, 10.407621608)
    add(part_1.part.scale(ESCALA6_SCALE).moved(Location((0, 0, -10.407621608))))


solid = part_2.part
